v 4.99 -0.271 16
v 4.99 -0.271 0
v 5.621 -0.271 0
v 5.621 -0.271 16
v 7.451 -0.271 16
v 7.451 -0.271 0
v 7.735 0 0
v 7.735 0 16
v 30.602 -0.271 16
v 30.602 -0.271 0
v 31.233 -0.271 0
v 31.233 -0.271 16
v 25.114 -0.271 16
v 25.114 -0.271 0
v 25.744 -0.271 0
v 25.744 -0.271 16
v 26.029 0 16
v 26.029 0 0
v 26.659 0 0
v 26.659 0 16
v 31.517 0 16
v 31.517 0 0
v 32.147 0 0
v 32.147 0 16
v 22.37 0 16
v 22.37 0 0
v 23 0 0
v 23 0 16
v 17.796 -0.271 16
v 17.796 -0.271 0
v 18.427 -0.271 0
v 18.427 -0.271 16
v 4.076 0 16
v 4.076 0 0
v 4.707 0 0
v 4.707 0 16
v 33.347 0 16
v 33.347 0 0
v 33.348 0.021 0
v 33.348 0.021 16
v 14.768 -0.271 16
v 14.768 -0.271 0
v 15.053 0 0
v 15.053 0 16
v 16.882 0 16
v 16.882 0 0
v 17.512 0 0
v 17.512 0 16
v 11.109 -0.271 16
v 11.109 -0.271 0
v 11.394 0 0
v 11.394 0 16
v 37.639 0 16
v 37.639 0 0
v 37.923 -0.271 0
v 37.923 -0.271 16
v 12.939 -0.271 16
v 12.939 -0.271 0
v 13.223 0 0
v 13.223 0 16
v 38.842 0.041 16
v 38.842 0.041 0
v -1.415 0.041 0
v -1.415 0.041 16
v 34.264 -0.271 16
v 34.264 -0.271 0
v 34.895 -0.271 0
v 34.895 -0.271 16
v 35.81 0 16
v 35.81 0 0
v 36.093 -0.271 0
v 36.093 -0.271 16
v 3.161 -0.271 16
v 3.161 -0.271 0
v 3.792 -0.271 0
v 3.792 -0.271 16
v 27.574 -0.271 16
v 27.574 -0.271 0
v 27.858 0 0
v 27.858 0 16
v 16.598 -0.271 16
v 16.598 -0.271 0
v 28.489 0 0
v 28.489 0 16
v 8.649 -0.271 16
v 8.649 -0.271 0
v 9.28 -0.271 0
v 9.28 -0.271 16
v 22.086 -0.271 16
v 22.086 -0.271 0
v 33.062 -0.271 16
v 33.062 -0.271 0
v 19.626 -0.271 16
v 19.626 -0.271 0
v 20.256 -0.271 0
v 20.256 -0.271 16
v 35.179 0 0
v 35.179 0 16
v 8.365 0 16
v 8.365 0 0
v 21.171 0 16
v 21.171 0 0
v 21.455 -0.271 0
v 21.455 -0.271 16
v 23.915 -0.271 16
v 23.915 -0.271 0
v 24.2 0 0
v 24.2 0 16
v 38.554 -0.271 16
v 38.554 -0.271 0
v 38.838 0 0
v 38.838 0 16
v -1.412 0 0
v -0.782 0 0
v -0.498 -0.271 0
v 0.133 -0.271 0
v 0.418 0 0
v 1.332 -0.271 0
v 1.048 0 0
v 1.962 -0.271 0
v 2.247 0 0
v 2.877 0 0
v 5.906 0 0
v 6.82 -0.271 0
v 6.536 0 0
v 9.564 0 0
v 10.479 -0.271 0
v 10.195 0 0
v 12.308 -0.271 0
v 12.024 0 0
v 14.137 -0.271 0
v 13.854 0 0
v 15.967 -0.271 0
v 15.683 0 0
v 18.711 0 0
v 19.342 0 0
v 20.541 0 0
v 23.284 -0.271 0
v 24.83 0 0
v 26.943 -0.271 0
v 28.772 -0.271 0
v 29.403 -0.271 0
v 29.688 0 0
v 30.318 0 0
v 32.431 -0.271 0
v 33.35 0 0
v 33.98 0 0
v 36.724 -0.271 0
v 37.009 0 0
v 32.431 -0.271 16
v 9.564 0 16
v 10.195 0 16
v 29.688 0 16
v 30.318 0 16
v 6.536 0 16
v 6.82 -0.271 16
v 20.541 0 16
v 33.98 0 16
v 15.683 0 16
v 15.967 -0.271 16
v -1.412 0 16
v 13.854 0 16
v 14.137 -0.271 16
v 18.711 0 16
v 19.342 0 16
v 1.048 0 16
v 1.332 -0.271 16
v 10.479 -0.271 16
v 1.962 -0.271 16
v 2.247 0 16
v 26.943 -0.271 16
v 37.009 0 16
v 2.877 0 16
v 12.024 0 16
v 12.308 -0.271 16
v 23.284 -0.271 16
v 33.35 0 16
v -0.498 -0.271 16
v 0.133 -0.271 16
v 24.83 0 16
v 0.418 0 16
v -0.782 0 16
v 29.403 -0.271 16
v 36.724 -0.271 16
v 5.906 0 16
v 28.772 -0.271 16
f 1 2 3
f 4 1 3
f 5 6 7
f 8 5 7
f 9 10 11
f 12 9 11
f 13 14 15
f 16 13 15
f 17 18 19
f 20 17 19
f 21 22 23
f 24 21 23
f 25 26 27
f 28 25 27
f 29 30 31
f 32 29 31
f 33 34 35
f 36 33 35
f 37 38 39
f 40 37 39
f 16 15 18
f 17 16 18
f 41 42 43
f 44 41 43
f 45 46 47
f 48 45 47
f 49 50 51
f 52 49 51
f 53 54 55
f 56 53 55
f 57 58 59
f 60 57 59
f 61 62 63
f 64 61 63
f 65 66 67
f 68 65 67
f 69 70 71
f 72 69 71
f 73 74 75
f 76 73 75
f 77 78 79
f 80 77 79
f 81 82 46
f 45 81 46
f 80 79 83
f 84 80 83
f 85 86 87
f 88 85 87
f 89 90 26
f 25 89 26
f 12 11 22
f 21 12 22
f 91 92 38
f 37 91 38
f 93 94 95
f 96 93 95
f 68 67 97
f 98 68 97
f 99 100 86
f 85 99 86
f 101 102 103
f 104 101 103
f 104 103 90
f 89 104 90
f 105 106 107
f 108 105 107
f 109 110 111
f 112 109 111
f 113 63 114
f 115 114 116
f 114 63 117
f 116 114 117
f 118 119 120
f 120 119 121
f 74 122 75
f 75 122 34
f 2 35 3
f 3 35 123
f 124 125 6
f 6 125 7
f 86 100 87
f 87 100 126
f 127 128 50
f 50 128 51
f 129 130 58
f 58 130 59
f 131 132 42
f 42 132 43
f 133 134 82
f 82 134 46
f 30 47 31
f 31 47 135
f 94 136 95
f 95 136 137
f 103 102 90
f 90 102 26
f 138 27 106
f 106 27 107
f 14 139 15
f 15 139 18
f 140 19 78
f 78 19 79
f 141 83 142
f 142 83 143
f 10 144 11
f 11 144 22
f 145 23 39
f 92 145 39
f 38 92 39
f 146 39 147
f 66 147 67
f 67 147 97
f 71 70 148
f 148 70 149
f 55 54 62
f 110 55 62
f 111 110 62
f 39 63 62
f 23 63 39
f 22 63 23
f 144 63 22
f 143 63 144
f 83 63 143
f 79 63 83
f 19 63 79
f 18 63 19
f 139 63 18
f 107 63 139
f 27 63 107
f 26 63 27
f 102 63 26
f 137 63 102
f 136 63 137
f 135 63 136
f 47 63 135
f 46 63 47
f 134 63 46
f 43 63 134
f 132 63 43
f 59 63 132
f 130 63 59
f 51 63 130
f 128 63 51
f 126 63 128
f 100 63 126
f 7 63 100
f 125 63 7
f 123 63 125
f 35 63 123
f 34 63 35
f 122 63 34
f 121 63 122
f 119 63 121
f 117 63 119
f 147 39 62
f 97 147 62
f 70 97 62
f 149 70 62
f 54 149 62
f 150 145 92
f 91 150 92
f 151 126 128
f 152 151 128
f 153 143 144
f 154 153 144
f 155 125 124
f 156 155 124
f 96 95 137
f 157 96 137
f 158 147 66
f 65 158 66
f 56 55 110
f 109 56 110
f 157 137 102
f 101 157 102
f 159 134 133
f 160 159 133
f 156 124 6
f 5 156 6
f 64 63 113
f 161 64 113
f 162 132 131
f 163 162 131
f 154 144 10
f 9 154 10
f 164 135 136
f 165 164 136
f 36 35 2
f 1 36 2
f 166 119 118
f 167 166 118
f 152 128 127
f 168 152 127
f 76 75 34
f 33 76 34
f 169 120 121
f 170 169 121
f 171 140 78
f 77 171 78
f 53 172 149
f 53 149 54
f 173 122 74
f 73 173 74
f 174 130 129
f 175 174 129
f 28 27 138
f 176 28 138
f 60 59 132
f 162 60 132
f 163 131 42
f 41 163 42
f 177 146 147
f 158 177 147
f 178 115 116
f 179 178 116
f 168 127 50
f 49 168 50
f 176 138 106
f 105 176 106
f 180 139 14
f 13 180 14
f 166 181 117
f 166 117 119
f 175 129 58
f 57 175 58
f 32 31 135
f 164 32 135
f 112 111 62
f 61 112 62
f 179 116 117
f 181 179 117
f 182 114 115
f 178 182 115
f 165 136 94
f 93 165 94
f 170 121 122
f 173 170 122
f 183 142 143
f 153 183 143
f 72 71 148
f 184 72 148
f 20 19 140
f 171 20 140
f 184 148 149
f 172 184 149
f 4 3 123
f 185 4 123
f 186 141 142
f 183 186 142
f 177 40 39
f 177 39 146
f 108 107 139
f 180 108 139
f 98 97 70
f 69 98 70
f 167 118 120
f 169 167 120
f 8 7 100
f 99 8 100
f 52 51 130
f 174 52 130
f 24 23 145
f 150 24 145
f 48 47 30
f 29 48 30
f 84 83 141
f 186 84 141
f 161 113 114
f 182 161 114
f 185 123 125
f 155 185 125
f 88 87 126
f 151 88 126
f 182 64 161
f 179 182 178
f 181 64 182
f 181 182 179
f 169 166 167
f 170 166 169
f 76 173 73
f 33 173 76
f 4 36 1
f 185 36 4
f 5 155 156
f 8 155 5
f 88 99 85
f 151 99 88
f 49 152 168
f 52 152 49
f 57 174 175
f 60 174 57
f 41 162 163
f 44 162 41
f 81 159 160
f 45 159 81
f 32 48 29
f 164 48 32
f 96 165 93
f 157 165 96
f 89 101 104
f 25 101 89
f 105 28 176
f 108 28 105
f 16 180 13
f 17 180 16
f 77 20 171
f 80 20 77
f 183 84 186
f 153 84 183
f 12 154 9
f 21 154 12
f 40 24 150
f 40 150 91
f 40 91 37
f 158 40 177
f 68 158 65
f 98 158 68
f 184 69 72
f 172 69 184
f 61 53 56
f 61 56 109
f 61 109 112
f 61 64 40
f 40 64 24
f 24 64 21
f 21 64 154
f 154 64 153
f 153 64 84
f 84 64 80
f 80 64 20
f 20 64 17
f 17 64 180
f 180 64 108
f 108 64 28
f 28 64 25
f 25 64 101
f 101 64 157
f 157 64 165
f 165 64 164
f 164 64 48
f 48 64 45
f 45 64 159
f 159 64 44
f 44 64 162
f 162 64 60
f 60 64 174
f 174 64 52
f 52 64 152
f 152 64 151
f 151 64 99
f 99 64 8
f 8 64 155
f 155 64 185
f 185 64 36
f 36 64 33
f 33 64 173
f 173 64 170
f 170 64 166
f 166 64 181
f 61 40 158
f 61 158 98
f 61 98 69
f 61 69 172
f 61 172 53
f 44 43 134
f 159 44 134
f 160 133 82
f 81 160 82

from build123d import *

# Parameters (mm, degrees)
F1_DEPTH = 16


with BuildPart() as f1:
    # F0 (on Top) → F1 (new body)
    with BuildSketch(Plane.XY):
        Polygon((0.414211, 0.041402), (-1.415181, 0.041402), (-1.411876, 0), (-0.781621, 0), (-0.497795, -0.270558), (0.132981, -0.270558), (0.417517, 0), align=None)
        Polygon((0.420945, 0.041402), (0.414211, 0.041402), (0.417517, 0), align=None)
        Polygon((2.243604, 0.041402), (0.420945, 0.041402), (0.417517, 0), (1.047772, 0), (1.331597, -0.270558), (1.962374, -0.270558), (2.246909, 0), align=None)
        Polygon((2.250337, 0.041402), (2.243604, 0.041402), (2.246909, 0), align=None)
        Polygon((4.072996, 0.041402), (2.250337, 0.041402), (2.246909, 0), (2.877164, 0), (3.160989, -0.270558), (3.791766, -0.270558), (4.076301, 0), align=None)
        Polygon((4.079729, 0.041402), (4.072996, 0.041402), (4.076301, 0), align=None)
        Polygon((5.902388, 0.041402), (4.079729, 0.041402), (4.076301, 0), (4.706556, 0), (4.990381, -0.270558), (5.621158, -0.270558), (5.905694, 0), align=None)
        Polygon((5.909122, 0.041402), (5.902388, 0.041402), (5.905694, 0), align=None)
        Polygon((7.73178, 0.041402), (5.909122, 0.041402), (5.905694, 0), (6.535948, 0), (6.819774, -0.270558), (7.450551, -0.270558), (7.735086, 0), align=None)
        Polygon((7.738514, 0.041402), (7.73178, 0.041402), (7.735086, 0), align=None)
        Polygon((9.561173, 0.041402), (7.738514, 0.041402), (7.735086, 0), (8.365341, 0), (8.649166, -0.270558), (9.279943, -0.270558), (9.564478, 0), align=None)
        Polygon((9.567906, 0.041402), (9.561173, 0.041402), (9.564478, 0), align=None)
        Polygon((11.390565, 0.041402), (9.567906, 0.041402), (9.564478, 0), (10.194733, 0), (10.478558, -0.270558), (11.109335, -0.270558), (11.39387, 0), align=None)
        Polygon((11.397298, 0.041402), (11.390565, 0.041402), (11.39387, 0), align=None)
        Polygon((13.219957, 0.041402), (11.397298, 0.041402), (11.39387, 0), (12.024125, 0), (12.307951, -0.270558), (12.938727, -0.270558), (13.223263, 0), align=None)
        Polygon((13.226691, 0.041402), (13.219957, 0.041402), (13.223263, 0), align=None)
        Polygon((15.04935, 0.041402), (13.226691, 0.041402), (13.223263, 0), (13.853518, 0), (14.137343, -0.270558), (14.76812, -0.270558), (15.052655, 0), align=None)
        Polygon((15.056083, 0.041402), (15.04935, 0.041402), (15.052655, 0), align=None)
        Polygon((16.878742, 0.041402), (15.056083, 0.041402), (15.052655, 0), (15.68291, 0), (15.966735, -0.270558), (16.597512, -0.270558), (16.882047, 0), align=None)
        Polygon((16.885475, 0.041402), (16.878742, 0.041402), (16.882047, 0), align=None)
        Polygon((18.708134, 0.041402), (16.885475, 0.041402), (16.882047, 0), (17.512302, 0), (17.796127, -0.270558), (18.426904, -0.270558), (18.711439, 0), align=None)
        Polygon((18.714868, 0.041402), (18.708134, 0.041402), (18.711439, 0), align=None)
        Polygon((20.537526, 0.041402), (18.714868, 0.041402), (18.711439, 0), (19.341694, 0), (19.62552, -0.270558), (20.256296, -0.270558), (20.540832, 0), align=None)
        Polygon((20.54426, 0.041402), (20.537526, 0.041402), (20.540832, 0), align=None)
        Polygon((22.366919, 0.041402), (20.54426, 0.041402), (20.540832, 0), (21.171087, 0), (21.454912, -0.270558), (22.085689, -0.270558), (22.370224, 0), align=None)
        Polygon((22.373652, 0.041402), (22.366919, 0.041402), (22.370224, 0), align=None)
        Polygon((24.196311, 0.041402), (22.373652, 0.041402), (22.370224, 0), (23.000479, 0), (23.284304, -0.270558), (23.915081, -0.270558), (24.199616, 0), align=None)
        Polygon((24.203044, 0.041402), (24.196311, 0.041402), (24.199616, 0), align=None)
        Polygon((26.025703, 0.041402), (24.203044, 0.041402), (24.199616, 0), (24.829871, 0), (25.113696, -0.270558), (25.744473, -0.270558), (26.029009, 0), align=None)
        Polygon((26.032437, 0.041402), (26.025703, 0.041402), (26.029009, 0), align=None)
        Polygon((27.855095, 0.041402), (26.032437, 0.041402), (26.029009, 0), (26.659264, 0), (26.943089, -0.270558), (27.573866, -0.270558), (27.858401, 0), align=None)
        Polygon((27.861829, 0.041402), (27.855095, 0.041402), (27.858401, 0), align=None)
        Polygon((29.684488, 0.041402), (27.861829, 0.041402), (27.858401, 0), (28.488656, 0), (28.772481, -0.270558), (29.403258, -0.270558), (29.687793, 0), align=None)
        Polygon((29.691221, 0.041402), (29.684488, 0.041402), (29.687793, 0), align=None)
        Polygon((31.51388, 0.041402), (29.691221, 0.041402), (29.687793, 0), (30.318048, 0), (30.601873, -0.270558), (31.23265, -0.270558), (31.517185, 0), align=None)
        Polygon((31.520614, 0.041402), (31.51388, 0.041402), (31.517185, 0), align=None)
        Polygon((33.3467, 0.041402), (31.520614, 0.041402), (31.517185, 0), (32.14744, 0), (32.431266, -0.270558), (33.062042, -0.270558), (33.346578, 0), (33.348323, 0.021078), align=None)
        Polygon((33.350006, 0.041402), (33.3467, 0.041402), (33.348323, 0.021078), align=None)
        Polygon((35.176093, 0.041402), (33.350006, 0.041402), (33.348323, 0.021078), (33.350006, 0), (33.980261, 0), (34.264086, -0.270558), (34.894863, -0.270558), (35.179398, 0), align=None)
        Polygon((35.182826, 0.041402), (35.176093, 0.041402), (35.179398, 0), align=None)
        Polygon((37.005485, 0.041402), (35.182826, 0.041402), (35.179398, 0), (35.809653, 0), (36.093478, -0.270558), (36.724255, -0.270558), (37.00879, 0), align=None)
        Polygon((37.012218, 0.041402), (37.005485, 0.041402), (37.00879, 0), align=None)
        Polygon((38.841611, 0.041402), (37.012218, 0.041402), (37.00879, 0), (37.639045, 0), (37.922871, -0.270558), (38.553647, -0.270558), (38.838183, 0), align=None)
    extrude(amount=F1_DEPTH)


solid = f1.part
